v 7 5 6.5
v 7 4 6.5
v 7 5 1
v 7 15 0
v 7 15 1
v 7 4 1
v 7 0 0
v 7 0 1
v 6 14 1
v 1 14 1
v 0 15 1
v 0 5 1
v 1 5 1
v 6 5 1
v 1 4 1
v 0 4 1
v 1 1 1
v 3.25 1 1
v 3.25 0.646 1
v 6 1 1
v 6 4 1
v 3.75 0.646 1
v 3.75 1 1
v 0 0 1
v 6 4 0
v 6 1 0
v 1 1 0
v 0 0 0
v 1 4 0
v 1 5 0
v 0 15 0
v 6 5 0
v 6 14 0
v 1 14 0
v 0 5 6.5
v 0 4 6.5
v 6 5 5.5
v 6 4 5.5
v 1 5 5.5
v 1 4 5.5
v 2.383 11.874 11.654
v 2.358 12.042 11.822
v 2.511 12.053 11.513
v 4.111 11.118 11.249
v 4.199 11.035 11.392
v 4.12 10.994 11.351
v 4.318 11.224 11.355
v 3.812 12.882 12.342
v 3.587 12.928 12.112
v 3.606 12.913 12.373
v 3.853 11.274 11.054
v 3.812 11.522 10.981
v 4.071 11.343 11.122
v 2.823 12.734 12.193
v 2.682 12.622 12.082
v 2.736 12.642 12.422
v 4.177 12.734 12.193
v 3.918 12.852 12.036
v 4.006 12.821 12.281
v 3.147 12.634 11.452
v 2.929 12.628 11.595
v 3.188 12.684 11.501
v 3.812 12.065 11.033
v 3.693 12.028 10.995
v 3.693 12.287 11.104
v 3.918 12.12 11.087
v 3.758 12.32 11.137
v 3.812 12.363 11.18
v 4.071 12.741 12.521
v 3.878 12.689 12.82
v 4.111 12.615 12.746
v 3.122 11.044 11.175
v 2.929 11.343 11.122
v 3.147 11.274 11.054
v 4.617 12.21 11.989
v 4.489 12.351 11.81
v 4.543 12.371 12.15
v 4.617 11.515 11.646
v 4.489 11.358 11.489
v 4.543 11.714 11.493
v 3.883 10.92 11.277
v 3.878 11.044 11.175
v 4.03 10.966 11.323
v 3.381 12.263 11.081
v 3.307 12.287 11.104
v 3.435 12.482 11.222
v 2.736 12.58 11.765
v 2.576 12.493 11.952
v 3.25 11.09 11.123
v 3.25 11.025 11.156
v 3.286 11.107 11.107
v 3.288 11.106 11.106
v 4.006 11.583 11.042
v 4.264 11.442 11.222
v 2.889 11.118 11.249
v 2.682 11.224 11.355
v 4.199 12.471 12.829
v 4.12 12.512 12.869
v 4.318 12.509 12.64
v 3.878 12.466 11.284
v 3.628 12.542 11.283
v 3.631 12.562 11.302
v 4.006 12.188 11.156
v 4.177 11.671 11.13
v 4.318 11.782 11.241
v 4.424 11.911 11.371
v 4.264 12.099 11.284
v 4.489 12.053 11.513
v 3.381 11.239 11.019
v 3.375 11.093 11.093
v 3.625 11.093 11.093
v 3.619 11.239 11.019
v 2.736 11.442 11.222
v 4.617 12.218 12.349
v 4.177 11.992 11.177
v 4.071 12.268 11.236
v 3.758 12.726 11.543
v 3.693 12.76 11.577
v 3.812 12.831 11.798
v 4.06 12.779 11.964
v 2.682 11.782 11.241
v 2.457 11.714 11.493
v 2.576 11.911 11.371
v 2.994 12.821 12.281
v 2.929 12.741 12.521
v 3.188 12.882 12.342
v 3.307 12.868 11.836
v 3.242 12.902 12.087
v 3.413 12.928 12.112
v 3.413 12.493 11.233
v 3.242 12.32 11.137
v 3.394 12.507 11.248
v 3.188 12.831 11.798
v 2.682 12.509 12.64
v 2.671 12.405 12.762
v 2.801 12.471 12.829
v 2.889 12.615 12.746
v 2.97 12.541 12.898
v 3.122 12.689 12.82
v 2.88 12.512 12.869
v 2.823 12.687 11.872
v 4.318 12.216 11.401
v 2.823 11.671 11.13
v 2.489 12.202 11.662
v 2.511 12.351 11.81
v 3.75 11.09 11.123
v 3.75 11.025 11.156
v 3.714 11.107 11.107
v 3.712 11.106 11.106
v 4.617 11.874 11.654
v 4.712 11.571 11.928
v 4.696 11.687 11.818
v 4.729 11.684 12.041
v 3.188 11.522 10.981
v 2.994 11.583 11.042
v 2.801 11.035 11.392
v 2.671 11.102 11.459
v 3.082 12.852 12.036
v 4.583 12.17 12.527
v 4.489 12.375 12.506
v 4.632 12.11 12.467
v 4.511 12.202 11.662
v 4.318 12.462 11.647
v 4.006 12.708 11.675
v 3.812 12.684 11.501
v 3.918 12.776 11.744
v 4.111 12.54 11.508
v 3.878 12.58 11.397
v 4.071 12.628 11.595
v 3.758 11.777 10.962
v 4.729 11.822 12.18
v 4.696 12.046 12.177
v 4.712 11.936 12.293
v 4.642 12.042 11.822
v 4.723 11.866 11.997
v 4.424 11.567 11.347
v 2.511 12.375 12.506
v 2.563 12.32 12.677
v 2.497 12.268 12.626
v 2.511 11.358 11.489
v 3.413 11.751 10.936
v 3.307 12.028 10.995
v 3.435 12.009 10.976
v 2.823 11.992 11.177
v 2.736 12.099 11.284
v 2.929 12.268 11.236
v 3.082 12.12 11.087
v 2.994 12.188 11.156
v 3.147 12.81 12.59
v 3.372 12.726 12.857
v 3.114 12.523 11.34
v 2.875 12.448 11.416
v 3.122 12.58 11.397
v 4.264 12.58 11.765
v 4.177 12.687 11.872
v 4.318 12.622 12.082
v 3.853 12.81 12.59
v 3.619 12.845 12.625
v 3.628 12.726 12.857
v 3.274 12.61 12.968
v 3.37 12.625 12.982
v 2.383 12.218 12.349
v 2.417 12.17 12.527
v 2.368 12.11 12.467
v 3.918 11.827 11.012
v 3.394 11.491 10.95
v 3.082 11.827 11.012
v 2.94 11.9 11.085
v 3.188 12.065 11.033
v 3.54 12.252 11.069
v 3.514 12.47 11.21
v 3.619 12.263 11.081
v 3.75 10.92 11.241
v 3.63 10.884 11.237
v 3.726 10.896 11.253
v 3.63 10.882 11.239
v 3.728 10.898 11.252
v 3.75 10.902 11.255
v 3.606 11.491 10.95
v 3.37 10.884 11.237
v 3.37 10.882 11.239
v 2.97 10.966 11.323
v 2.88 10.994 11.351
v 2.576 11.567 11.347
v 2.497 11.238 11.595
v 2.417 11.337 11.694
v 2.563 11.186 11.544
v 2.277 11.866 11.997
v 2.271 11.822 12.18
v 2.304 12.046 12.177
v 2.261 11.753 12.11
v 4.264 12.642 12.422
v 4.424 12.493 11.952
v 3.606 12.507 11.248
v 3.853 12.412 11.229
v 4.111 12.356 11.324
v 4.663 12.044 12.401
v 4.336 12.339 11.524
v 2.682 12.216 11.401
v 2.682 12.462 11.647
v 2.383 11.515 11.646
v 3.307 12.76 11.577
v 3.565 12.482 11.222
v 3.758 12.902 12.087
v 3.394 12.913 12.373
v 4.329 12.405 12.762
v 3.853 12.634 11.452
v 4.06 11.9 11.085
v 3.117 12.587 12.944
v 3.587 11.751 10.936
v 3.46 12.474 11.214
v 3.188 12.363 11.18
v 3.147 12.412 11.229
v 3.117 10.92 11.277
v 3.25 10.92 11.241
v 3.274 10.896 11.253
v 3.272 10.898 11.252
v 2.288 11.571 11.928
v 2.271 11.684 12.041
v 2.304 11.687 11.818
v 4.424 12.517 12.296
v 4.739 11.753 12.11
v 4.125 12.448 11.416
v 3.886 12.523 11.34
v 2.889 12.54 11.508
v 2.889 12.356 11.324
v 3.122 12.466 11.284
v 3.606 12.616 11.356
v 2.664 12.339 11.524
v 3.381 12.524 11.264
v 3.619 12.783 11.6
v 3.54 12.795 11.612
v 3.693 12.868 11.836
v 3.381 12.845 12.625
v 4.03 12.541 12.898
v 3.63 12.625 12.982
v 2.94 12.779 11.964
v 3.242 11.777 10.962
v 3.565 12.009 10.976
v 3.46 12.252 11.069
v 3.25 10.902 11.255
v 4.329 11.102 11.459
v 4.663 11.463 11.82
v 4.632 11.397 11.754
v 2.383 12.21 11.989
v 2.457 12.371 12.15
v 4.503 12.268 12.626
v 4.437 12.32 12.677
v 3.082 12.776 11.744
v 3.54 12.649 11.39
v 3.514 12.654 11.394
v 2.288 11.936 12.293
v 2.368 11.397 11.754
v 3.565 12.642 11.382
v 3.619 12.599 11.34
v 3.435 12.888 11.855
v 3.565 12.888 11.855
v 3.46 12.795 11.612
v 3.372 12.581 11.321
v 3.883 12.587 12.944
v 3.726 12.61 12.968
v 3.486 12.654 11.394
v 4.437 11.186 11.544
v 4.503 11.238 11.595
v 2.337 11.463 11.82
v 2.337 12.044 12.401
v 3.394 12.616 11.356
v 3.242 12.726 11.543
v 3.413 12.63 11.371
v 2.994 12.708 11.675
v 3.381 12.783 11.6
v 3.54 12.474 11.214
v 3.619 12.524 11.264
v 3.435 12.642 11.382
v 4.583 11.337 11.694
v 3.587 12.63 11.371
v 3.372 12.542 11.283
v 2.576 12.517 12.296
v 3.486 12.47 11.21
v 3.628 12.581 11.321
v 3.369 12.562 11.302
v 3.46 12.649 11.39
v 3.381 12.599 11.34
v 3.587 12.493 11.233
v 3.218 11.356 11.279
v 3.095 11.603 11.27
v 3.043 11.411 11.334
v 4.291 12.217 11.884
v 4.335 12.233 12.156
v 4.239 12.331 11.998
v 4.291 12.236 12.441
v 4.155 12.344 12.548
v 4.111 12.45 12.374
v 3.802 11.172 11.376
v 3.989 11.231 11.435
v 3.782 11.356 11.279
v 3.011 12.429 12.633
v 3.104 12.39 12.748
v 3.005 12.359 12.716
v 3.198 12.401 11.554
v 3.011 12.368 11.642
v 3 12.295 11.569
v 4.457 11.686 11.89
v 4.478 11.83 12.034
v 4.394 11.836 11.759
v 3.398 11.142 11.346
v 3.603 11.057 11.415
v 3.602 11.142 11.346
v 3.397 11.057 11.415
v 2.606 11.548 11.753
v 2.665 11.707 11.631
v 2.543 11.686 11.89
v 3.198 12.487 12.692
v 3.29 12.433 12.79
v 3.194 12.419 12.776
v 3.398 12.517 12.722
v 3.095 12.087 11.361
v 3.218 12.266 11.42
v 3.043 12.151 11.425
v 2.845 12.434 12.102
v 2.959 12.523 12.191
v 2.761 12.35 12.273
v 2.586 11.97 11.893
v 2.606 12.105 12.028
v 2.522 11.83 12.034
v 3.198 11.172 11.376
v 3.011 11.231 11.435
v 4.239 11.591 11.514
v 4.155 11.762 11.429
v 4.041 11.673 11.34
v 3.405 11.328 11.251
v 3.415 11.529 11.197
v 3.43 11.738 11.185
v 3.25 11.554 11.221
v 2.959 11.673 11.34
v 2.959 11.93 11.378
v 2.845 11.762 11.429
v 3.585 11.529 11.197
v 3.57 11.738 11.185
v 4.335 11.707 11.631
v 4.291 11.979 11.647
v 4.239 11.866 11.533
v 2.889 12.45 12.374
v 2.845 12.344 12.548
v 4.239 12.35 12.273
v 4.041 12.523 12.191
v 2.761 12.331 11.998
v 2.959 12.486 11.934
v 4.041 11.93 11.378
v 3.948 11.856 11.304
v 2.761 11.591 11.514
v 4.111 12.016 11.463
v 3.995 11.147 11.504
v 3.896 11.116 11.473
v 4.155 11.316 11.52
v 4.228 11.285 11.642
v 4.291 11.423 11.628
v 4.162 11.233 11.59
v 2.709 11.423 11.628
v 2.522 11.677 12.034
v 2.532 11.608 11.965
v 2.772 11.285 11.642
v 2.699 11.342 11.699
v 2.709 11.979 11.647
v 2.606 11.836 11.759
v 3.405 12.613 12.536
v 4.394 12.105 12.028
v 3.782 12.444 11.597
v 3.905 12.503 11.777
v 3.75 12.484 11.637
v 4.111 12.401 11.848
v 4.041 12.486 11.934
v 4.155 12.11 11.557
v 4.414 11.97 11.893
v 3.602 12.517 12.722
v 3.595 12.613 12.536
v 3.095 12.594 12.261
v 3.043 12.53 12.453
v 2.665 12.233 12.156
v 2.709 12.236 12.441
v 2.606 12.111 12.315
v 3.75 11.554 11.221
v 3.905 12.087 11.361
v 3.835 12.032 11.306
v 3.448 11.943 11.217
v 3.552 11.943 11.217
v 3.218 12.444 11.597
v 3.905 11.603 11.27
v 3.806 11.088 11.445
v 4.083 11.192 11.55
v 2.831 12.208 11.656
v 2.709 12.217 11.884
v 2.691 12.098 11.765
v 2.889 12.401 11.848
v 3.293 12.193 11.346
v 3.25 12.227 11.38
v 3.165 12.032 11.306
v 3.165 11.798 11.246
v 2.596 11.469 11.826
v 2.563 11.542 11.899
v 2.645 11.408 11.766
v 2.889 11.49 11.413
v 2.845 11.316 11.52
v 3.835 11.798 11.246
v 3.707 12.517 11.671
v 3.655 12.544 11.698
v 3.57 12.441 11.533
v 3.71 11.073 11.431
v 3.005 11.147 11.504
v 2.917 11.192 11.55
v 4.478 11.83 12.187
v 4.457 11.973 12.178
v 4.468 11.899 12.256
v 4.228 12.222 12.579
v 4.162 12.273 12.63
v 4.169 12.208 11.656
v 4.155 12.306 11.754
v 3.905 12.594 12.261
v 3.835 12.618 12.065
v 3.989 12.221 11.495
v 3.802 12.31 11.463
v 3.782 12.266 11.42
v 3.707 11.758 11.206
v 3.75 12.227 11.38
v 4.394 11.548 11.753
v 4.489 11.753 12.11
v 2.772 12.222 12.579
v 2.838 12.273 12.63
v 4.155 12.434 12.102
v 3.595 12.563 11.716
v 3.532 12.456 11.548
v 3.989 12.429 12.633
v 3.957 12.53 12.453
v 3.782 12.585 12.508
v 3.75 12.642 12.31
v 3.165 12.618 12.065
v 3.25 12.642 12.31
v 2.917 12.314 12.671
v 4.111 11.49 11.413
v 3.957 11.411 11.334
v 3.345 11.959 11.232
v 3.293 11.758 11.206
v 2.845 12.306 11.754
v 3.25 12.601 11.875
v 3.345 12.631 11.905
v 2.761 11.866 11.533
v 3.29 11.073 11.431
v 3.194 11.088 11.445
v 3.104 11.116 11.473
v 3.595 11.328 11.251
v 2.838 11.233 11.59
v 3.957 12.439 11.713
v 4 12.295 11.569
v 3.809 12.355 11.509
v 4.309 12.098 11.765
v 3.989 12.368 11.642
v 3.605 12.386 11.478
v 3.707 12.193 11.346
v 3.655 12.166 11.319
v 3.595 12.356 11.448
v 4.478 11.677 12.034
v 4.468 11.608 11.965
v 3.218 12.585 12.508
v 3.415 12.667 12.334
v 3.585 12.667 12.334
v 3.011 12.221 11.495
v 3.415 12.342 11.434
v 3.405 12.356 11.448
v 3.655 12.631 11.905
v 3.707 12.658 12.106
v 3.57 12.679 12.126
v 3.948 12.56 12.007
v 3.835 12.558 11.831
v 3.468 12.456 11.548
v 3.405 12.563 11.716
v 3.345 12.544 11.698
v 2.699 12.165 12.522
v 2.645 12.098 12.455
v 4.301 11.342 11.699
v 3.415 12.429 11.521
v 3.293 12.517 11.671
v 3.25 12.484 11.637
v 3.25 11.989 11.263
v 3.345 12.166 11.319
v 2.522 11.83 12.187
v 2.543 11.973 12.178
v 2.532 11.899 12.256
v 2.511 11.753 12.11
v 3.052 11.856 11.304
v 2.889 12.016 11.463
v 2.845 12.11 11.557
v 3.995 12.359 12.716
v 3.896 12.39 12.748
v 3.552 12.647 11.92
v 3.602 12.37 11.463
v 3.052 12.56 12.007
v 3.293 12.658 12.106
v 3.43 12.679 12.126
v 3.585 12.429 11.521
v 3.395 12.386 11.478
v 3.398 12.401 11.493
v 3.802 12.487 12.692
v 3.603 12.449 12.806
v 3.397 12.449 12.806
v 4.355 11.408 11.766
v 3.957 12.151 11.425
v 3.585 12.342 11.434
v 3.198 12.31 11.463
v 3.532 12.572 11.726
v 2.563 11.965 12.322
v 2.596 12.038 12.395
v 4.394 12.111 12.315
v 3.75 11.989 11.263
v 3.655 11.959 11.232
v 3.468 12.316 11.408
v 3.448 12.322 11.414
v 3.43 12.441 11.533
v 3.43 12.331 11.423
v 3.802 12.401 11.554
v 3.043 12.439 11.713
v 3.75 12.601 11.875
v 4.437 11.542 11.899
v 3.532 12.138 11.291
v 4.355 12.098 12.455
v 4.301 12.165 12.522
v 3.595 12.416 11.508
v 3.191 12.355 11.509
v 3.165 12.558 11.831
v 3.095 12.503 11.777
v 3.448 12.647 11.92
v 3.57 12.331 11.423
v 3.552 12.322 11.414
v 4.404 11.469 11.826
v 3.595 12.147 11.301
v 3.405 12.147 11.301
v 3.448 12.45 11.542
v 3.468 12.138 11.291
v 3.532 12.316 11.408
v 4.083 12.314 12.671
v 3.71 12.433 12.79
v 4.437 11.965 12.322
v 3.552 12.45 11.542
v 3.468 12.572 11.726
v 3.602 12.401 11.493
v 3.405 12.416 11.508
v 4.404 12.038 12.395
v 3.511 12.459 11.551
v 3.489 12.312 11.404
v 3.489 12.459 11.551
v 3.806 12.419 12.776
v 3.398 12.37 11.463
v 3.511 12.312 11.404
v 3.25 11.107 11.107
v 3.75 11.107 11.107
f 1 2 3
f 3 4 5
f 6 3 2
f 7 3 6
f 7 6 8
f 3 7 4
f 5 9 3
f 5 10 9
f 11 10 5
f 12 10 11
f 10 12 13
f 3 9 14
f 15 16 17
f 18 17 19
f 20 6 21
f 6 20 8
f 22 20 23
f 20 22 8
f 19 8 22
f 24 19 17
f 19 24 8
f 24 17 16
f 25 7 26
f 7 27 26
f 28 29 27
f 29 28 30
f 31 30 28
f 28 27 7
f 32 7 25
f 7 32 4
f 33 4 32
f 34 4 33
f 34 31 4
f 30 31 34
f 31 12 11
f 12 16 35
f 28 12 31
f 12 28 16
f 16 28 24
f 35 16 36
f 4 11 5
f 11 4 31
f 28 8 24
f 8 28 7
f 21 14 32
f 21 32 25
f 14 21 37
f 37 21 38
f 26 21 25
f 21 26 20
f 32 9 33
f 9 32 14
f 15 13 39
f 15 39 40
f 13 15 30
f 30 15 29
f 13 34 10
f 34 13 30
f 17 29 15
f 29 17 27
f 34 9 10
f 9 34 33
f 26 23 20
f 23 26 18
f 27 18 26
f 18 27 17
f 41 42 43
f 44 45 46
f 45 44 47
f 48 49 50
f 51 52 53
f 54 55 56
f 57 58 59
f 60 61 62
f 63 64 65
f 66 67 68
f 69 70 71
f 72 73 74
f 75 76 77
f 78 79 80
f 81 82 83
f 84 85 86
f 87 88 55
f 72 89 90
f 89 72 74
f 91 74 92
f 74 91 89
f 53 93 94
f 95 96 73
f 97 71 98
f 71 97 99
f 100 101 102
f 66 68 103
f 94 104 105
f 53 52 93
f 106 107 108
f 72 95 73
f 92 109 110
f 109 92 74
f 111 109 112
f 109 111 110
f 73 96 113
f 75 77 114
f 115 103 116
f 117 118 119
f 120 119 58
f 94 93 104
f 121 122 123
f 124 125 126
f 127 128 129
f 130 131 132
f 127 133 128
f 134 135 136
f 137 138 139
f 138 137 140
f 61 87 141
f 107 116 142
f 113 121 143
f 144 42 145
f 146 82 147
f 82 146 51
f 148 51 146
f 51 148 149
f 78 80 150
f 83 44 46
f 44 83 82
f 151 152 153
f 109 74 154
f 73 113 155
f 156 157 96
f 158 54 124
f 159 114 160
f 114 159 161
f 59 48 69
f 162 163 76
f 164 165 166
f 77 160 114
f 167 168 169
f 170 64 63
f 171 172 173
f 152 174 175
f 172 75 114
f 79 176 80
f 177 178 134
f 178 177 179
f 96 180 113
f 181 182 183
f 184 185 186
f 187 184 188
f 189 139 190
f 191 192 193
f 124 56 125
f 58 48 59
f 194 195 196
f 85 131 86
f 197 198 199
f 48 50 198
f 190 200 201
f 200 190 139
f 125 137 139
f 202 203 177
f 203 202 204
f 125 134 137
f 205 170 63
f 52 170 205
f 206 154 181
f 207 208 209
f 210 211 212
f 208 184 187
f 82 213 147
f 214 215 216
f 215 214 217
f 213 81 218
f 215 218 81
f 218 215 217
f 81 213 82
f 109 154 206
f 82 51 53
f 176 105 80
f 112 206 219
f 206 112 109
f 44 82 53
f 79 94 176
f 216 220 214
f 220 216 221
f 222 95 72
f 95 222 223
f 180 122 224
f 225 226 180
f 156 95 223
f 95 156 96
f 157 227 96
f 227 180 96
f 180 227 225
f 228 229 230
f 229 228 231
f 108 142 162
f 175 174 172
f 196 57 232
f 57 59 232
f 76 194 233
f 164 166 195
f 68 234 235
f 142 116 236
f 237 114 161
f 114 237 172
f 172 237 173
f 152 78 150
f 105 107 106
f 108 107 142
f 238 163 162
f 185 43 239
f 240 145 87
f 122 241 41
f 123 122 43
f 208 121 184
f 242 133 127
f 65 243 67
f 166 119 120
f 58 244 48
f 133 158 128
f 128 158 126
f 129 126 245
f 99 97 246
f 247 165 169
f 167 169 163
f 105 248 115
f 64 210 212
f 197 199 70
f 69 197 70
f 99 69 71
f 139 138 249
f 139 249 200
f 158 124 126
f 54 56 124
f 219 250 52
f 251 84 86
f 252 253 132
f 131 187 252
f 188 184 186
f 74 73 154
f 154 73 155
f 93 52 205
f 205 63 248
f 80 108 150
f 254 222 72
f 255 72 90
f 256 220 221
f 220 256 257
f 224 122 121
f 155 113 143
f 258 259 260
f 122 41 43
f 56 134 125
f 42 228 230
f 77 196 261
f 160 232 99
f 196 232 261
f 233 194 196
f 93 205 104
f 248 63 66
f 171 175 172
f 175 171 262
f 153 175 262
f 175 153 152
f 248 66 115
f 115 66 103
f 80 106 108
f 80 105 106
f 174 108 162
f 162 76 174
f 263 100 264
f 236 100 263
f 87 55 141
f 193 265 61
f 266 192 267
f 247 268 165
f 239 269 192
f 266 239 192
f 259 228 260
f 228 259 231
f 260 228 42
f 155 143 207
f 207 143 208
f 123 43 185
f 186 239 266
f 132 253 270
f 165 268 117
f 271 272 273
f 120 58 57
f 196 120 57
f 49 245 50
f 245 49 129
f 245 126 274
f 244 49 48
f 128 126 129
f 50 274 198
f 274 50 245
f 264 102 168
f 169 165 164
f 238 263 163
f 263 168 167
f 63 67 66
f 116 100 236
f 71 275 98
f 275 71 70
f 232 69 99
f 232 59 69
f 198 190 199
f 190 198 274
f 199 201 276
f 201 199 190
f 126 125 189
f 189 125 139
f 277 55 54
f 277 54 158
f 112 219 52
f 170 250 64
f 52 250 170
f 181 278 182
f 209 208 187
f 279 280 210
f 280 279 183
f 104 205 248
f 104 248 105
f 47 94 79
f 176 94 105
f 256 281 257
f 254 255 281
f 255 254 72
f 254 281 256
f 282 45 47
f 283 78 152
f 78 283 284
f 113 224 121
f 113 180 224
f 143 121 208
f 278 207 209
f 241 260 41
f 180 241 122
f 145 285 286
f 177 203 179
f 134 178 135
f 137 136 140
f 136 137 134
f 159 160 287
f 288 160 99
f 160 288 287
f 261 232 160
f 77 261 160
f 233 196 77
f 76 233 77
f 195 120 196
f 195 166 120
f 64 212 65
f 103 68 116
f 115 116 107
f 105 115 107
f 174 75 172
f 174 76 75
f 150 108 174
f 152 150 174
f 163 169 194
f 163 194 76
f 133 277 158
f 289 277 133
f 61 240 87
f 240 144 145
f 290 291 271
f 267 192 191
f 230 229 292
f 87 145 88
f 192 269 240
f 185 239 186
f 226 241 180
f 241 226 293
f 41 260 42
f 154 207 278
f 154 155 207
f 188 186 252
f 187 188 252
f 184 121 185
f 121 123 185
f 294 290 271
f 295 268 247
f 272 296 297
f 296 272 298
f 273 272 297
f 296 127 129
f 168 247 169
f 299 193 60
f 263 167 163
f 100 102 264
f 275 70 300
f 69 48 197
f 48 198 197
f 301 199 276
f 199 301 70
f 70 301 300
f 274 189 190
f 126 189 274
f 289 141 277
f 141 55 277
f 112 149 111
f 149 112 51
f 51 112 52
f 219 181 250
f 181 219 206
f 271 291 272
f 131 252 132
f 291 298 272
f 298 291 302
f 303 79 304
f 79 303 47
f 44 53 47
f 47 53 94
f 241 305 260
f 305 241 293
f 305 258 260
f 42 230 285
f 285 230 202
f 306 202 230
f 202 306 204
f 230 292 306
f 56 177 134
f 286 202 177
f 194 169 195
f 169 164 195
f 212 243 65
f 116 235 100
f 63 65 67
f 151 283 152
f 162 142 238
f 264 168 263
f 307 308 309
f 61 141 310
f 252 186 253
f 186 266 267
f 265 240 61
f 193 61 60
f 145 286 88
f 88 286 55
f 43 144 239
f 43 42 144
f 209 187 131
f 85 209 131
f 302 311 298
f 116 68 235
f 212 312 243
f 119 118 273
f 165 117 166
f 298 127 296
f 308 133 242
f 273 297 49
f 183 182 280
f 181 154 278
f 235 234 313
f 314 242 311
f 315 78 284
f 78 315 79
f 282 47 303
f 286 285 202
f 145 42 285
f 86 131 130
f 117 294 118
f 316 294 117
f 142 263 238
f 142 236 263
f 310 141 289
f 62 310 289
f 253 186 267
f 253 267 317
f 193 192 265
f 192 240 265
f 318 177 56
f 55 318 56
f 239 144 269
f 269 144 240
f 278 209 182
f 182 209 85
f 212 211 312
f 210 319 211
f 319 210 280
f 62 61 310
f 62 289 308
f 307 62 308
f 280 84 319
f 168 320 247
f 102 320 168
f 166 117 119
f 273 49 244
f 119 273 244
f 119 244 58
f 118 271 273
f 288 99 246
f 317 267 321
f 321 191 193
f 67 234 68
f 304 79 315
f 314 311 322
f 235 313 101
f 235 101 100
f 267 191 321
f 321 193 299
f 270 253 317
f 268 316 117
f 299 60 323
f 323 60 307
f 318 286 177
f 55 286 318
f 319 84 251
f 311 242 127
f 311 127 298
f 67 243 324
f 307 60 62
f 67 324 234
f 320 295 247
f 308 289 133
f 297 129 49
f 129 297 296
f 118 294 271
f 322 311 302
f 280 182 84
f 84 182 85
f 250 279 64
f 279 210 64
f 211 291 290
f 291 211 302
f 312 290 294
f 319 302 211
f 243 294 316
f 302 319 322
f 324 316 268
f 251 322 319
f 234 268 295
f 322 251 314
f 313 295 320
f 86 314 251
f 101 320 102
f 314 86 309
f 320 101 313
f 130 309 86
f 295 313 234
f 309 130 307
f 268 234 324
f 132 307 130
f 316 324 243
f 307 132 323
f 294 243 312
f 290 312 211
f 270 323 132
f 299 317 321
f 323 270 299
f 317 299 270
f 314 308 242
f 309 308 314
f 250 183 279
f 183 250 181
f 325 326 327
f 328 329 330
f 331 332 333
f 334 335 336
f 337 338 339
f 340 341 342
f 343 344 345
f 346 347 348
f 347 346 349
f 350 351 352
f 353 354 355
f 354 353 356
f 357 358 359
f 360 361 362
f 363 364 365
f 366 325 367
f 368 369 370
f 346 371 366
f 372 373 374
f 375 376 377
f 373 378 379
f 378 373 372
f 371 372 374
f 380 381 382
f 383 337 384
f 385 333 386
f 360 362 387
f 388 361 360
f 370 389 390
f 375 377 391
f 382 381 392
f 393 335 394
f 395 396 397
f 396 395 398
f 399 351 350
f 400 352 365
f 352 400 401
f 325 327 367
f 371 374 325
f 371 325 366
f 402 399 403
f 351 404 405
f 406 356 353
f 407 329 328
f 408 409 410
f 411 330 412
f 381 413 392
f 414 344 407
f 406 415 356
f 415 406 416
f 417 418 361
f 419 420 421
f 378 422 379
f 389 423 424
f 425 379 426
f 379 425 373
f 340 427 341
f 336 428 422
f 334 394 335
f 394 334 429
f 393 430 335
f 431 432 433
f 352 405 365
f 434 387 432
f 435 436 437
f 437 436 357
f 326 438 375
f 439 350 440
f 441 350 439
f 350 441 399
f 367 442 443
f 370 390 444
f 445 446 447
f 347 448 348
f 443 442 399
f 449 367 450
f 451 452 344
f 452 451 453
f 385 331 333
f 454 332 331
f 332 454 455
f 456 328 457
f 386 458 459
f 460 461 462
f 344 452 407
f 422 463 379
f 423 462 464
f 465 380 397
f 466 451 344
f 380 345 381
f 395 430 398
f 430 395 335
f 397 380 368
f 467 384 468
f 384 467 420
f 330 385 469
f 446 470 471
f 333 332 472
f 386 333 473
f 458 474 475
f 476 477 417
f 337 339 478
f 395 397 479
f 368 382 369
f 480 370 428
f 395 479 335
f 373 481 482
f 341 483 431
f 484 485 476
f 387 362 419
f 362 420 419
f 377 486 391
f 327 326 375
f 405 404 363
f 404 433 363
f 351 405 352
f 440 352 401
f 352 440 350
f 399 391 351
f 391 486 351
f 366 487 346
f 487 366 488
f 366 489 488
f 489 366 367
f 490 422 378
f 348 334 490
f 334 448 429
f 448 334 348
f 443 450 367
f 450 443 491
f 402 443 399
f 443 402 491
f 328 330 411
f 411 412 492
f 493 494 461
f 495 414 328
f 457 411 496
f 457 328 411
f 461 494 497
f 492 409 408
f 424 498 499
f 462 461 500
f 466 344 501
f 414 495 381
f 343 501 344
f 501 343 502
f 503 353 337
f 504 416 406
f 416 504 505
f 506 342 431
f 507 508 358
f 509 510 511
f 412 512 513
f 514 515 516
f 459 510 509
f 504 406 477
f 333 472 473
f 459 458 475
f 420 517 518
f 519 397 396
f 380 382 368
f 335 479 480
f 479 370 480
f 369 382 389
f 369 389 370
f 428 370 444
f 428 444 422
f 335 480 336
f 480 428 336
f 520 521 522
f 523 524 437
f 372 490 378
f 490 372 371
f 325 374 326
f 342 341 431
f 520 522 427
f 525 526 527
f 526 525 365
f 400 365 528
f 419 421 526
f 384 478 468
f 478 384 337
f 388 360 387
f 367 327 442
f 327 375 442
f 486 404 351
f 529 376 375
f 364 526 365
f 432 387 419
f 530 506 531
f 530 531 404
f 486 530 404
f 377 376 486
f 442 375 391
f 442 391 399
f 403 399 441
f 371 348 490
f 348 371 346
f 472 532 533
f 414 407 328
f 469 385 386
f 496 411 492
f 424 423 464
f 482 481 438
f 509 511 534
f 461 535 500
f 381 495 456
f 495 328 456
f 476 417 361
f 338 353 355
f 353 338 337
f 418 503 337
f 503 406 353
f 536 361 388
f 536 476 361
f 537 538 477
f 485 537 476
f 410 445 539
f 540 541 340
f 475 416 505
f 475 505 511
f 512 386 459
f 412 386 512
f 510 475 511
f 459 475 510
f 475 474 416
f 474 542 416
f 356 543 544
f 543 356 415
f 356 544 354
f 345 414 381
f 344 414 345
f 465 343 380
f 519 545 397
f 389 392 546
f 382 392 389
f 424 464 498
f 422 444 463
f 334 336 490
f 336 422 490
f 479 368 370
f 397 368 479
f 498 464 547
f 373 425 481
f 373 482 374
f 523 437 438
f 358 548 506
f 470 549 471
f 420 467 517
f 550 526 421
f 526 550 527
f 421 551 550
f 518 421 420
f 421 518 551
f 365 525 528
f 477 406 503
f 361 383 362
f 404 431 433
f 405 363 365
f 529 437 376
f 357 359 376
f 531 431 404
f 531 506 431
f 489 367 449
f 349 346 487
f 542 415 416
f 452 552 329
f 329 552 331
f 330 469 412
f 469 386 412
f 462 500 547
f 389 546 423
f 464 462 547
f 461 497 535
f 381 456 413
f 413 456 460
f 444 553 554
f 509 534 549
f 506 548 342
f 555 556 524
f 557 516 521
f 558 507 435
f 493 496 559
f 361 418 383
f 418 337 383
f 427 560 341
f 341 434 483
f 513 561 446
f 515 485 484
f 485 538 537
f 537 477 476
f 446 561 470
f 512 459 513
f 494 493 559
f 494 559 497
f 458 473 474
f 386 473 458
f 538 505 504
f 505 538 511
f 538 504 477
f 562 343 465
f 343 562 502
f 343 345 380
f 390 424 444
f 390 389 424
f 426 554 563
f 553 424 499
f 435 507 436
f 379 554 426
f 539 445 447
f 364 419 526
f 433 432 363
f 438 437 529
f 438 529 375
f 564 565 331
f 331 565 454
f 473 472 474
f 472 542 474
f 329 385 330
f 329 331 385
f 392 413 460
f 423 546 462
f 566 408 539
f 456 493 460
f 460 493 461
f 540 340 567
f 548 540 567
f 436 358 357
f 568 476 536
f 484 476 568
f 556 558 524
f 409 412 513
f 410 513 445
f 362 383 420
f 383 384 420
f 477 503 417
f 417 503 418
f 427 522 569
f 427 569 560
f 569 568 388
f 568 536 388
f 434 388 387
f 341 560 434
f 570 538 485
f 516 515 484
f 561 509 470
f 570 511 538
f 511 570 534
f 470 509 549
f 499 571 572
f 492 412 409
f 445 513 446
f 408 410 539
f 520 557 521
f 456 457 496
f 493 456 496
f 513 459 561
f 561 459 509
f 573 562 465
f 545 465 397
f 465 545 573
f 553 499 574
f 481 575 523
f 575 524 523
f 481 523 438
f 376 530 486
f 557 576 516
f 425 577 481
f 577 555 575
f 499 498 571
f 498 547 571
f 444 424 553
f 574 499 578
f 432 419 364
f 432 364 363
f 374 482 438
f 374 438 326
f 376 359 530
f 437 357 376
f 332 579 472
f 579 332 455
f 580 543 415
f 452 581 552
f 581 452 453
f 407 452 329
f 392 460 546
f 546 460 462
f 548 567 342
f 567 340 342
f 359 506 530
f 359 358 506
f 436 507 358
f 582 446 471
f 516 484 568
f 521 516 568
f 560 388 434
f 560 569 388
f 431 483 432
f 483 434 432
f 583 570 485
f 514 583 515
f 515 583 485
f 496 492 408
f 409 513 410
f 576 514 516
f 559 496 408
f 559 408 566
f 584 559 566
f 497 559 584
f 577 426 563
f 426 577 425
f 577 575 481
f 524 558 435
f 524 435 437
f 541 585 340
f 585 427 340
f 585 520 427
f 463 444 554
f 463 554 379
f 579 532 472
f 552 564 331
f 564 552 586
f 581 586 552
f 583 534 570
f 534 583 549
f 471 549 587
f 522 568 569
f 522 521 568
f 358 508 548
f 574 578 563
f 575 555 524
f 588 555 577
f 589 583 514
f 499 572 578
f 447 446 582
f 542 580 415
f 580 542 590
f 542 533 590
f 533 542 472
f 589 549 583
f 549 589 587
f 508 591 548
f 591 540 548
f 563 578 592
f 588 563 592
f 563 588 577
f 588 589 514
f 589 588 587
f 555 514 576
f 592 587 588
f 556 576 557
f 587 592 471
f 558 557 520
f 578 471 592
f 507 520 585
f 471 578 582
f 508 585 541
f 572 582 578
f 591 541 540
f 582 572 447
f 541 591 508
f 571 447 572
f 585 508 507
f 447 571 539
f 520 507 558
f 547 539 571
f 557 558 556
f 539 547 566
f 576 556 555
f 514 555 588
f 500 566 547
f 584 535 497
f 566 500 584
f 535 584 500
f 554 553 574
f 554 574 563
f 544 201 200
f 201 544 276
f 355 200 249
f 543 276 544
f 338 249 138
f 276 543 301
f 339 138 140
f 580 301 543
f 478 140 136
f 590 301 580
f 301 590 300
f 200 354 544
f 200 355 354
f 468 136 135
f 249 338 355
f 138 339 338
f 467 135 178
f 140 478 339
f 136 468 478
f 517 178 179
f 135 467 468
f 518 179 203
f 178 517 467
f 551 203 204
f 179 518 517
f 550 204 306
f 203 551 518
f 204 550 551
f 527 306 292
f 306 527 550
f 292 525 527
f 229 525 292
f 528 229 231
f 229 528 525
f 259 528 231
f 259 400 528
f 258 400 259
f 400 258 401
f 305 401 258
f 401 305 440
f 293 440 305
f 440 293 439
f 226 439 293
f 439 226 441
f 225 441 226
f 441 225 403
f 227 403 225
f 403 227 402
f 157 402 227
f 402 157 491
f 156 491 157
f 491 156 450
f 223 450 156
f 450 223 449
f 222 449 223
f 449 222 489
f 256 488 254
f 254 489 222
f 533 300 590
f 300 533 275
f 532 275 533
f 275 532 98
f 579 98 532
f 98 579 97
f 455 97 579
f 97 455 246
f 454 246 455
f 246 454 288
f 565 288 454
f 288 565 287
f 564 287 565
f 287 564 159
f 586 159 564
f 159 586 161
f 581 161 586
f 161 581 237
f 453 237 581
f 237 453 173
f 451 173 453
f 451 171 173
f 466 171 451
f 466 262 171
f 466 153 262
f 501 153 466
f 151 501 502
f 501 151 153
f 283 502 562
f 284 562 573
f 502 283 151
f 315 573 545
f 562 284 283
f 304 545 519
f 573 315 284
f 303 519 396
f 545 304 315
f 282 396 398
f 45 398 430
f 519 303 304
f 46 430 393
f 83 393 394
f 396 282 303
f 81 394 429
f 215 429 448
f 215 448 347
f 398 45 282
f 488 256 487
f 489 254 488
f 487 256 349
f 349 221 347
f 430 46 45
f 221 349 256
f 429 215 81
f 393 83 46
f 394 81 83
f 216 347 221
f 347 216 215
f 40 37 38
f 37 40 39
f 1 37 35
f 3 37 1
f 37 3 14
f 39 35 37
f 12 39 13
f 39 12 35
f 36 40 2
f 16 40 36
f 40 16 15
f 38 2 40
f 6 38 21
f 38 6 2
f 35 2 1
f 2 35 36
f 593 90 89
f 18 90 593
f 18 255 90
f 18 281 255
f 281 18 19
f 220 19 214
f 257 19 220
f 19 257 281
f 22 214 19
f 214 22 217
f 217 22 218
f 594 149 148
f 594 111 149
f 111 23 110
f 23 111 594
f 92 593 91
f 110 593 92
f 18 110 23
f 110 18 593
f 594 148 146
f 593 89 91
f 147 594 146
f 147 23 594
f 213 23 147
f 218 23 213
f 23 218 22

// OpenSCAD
// model of a catapult with as many customizable parameters as possible to allow for various trajectory experiments in a physics demo

//************************************************************
//PARAMETERS
//************************************************************
// Base width
baseWidth = 7; //[5:30]
// Base length
baseLength = 15; //[5:30]
// Base height
baseHeight = 1; //[0.5:1]
// Base thickness
baseThick = 1; //[0.5:1]
// Arm length
armLength = 15; //[5:50]
// Arm width
armWidth = 0.5; //[0.25:3]
// Arm thickness
armThick = 0.25; //[0.25:1]
// Arm angle
angle = 45; //[5:90]
// Radius of bucket
bucketRad = 1; //[0.25:10]
// Bucket thickness
bucketThick = 0.25; //[0.25:1]
// Crossbar height (set to 0 if you don't want a crossbar)
barHeight = 5.5; //[0:40]
// Crossbar distance from front
barY = 4; //[0:20]
// Front support length (may be needed to prevent front flips)
suppLength = 0; //[0:15]

//************************************************************
//MATH
//************************************************************
holeWidth = baseWidth - (2*baseThick);
holeLength = baseLength - (2*baseThick);
holeHeight = baseHeight + 2;

armX = (baseWidth - armWidth)/2;
armY = baseThick/2;
armZ = baseHeight/2;

bucketX = baseWidth/2;
bucketY = ((baseThick/2) + ((armLength + bucketRad + bucketThick - armThick)*cos(angle)) - (armThick*sin(angle))) * 1.01;
bucketZ = ((baseHeight/2) + ((armLength + bucketRad + bucketThick - armThick)*sin(angle)) + (armThick*cos(angle))) * 1.01;

//************************************************************
//RENDERS
//************************************************************
$fn = 30;

// translate cube up to x-y plane to make printers happy
//translate([0,0,baseHeight/2]){
	catapult();
//}

//************************************************************
//MODULES
//************************************************************
module catapult(){
    union(){
        base();
        arm();
        bucket();
        if(barHeight != 0){
            crossbar();
        }
        if(suppLength != 0){
            support();
        }
    }
}

module base(){
    difference(){
        cube([baseWidth,baseLength,baseHeight],false);
        translate([baseThick,baseThick,-1]){
            cube([holeWidth,holeLength,holeHeight],false);        
        }
    }
}

module arm(){
    translate([armX,armY,armZ]){
        rotate([angle,0,0]){
            cube([armWidth,armLength,armThick],false);
        }
    }
}

module bucket(){
    translate([bucketX,bucketY,bucketZ]){
        rotate([angle,0,0]){
            translate([0,0,bucketRad*0.1]){
                difference(){
                    sphere(bucketRad+bucketThick);
                    sphere(bucketRad);
                    translate([0,0,(bucketRad*1.5)-(bucketRad*0.1)]){
                        cube([(bucketRad+1)*3,(bucketRad+1)*3,bucketRad*3],true);
                    }
                }
            }
        }
    }
}

module crossbar(){
    translate([0,barY,0]){
        cube([baseThick,baseThick,barHeight]);
    }
    translate([baseWidth-baseThick,barY,0]){
        cube([baseThick,baseThick,barHeight]);
    }
    translate([0,barY,barHeight]){
        cube([baseWidth,baseThick,baseThick]);
    }
}

module support(){
    translate([0,-suppLength,0]){
        cube([baseThick,suppLength,baseHeight]);
    }
    translate([baseWidth-baseThick,-suppLength,0]){
        cube([baseThick,suppLength,baseHeight]);
    }
}
